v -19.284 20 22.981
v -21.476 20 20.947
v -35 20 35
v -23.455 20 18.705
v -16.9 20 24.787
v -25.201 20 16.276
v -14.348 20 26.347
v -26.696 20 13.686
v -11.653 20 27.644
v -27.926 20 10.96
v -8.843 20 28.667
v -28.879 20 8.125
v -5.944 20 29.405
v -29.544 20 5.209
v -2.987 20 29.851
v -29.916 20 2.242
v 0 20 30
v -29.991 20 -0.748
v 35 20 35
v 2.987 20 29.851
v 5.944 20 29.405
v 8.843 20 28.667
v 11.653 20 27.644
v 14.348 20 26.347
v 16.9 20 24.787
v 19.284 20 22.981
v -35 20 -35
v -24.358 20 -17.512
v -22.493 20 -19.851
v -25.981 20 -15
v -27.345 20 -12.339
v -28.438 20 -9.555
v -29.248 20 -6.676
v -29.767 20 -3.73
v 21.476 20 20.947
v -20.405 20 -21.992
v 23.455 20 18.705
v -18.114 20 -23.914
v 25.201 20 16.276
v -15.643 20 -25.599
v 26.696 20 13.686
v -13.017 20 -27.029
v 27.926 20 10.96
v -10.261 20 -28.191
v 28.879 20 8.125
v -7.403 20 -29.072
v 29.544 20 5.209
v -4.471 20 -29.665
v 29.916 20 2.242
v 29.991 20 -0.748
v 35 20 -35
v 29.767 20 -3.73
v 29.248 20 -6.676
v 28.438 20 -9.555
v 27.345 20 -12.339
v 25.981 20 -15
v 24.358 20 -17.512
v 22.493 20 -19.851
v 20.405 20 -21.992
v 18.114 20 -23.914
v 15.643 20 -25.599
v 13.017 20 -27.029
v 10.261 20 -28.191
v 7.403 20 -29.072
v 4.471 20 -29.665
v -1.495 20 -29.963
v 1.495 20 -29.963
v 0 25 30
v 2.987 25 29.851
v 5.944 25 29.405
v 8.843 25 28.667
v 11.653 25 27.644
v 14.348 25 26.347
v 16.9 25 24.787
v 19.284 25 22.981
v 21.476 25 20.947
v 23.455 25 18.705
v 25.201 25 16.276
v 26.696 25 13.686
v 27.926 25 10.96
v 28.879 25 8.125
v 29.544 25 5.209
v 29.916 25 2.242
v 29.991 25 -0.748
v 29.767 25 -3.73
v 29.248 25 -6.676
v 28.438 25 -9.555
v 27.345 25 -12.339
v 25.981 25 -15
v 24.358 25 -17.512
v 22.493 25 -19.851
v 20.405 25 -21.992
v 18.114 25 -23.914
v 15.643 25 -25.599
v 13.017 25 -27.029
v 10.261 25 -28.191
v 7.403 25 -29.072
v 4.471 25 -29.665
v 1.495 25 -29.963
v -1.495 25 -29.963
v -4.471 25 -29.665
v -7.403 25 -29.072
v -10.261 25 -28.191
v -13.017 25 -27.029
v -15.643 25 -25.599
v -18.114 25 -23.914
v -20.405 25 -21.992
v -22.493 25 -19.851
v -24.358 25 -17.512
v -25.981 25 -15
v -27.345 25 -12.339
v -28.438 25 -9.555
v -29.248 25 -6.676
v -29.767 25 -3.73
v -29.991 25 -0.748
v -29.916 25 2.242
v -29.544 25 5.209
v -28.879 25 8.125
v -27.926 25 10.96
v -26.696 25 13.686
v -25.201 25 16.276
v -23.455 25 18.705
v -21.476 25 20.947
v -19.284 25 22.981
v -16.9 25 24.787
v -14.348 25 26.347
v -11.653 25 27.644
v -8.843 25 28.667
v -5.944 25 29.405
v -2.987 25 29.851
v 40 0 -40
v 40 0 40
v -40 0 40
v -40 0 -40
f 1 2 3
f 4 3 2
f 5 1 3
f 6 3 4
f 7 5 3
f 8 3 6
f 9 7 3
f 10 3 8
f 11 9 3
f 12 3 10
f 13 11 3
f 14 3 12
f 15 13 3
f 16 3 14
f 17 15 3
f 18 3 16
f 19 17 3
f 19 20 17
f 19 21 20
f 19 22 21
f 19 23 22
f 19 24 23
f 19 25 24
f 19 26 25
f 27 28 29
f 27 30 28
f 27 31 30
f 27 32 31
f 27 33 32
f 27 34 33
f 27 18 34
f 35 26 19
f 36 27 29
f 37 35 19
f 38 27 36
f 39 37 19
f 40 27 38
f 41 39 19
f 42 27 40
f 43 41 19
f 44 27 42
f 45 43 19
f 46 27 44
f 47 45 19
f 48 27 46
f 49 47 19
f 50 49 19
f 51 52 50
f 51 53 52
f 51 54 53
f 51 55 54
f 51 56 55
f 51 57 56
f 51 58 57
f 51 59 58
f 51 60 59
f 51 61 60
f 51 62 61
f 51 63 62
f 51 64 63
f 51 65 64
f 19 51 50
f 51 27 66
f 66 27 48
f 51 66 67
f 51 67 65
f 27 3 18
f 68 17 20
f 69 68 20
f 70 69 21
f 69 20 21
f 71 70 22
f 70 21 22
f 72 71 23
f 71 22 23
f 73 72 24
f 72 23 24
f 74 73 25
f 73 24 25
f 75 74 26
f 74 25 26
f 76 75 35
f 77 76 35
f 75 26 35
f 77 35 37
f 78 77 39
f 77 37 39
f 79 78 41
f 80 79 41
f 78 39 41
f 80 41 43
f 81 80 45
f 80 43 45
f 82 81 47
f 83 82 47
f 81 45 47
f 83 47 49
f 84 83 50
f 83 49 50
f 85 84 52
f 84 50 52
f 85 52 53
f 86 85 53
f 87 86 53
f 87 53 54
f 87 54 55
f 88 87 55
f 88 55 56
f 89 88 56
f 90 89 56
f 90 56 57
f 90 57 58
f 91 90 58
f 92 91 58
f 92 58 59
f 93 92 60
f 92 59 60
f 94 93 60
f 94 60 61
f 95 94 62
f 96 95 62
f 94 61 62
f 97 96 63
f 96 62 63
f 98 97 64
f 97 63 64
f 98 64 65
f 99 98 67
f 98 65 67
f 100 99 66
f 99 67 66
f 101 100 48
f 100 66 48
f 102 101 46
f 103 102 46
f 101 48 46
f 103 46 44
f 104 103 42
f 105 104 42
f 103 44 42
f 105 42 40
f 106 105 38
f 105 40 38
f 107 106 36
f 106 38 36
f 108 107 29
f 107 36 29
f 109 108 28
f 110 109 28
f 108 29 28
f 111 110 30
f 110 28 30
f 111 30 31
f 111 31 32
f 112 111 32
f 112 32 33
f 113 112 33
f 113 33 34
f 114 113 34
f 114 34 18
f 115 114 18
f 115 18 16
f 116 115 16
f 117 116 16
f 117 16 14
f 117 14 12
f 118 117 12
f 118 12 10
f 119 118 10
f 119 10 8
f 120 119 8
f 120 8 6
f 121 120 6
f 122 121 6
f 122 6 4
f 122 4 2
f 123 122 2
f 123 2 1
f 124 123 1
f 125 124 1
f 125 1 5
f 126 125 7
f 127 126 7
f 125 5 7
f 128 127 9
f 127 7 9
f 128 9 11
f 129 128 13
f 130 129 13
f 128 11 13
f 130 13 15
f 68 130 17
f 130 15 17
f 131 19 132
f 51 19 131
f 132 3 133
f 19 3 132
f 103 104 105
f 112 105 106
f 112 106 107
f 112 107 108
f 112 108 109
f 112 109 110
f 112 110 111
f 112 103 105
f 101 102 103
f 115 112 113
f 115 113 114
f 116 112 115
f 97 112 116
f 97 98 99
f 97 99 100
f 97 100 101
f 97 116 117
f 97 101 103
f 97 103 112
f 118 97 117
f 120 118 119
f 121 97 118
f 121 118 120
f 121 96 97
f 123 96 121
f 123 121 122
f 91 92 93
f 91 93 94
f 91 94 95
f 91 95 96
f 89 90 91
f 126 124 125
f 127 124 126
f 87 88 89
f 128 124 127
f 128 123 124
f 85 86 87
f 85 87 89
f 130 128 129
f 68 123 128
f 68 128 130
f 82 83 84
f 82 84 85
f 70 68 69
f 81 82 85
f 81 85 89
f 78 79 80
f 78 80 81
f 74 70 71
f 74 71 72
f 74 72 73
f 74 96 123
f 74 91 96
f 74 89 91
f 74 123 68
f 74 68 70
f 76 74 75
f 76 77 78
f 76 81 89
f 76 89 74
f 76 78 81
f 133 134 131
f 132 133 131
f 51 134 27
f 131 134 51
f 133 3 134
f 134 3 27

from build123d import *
from OCP.BRepFilletAPI import BRepFilletAPI_MakeChamfer

# Parameters (mm, degrees)
SKETCH_1_W       = 80
SKETCH_1_H       = 80
EXTRUDE_1_DEPTH  = 20
SKETCH_2_R       = 30
EXTRUDE_2_DEPTH  = 5
CHAMFER_1_SIZE   = 20
CHAMFER_1_SIZE_2 = 5


with BuildPart() as part:
    # Эскиз1 → Бобышка-Вытянуть1 (new body)
    with BuildSketch(Plane(origin=(0, 0, 0), x_dir=(1, 0, 0), z_dir=(0, 1, 0))):
        Rectangle(SKETCH_1_W, SKETCH_1_H)
    extrude(amount=EXTRUDE_1_DEPTH)

    # Эскиз2 → Бобышка-Вытянуть2 (add)
    with BuildSketch(Plane(origin=(0, 20, 0), x_dir=(1, 0, 0), z_dir=(0, 1, 0))):
        with Locations(Location((0, 0, 0), (0, 0, 270))):
            Circle(SKETCH_2_R)
    extrude(amount=EXTRUDE_2_DEPTH)

    # Фаска1
    chamfer_1_edges_1 = [part.edges().sort_by_distance(p)[0] for p in [
        (40, 20, 0),
    ]]
    chamfer_1_side_1 = [part.faces().sort_by_distance(p)[0] for p in [
        (40, 19.9, 0),
    ]]
    chamfer_1_edges_2 = [part.edges().sort_by_distance(p)[0] for p in [
        (0, 20, -40),
    ]]
    chamfer_1_side_2 = [part.faces().sort_by_distance(p)[0] for p in [
        (0, 20, -39.9),
    ]]
    chamfer_1_edges_3 = [part.edges().sort_by_distance(p)[0] for p in [
        (-40, 20, 0),
    ]]
    chamfer_1_side_3 = [part.faces().sort_by_distance(p)[0] for p in [
        (-40, 19.9, 0),
    ]]
    chamfer_1_edges_4 = [part.edges().sort_by_distance(p)[0] for p in [
        (0, 20, 40),
    ]]
    chamfer_1_side_4 = [part.faces().sort_by_distance(p)[0] for p in [
        (0, 19.9, 40),
    ]]
    chamfer_1 = BRepFilletAPI_MakeChamfer(part.part.solid().wrapped)
    for e in chamfer_1_edges_1:
        chamfer_1.Add(CHAMFER_1_SIZE - 0.0001, CHAMFER_1_SIZE_2 - 0.0001, e.wrapped, chamfer_1_side_1[0].wrapped)
    for e in chamfer_1_edges_2:
        chamfer_1.Add(CHAMFER_1_SIZE_2 - 0.0001, CHAMFER_1_SIZE - 0.0001, e.wrapped, chamfer_1_side_2[0].wrapped)
    for e in chamfer_1_edges_3:
        chamfer_1.Add(CHAMFER_1_SIZE - 0.0001, CHAMFER_1_SIZE_2 - 0.0001, e.wrapped, chamfer_1_side_3[0].wrapped)
    for e in chamfer_1_edges_4:
        chamfer_1.Add(CHAMFER_1_SIZE - 0.0001, CHAMFER_1_SIZE_2 - 0.0001, e.wrapped, chamfer_1_side_4[0].wrapped)
    add(Compound.cast(chamfer_1.Shape()), mode=Mode.REPLACE)  # a hair under: the kernel refuses the full size


solid = part.part
